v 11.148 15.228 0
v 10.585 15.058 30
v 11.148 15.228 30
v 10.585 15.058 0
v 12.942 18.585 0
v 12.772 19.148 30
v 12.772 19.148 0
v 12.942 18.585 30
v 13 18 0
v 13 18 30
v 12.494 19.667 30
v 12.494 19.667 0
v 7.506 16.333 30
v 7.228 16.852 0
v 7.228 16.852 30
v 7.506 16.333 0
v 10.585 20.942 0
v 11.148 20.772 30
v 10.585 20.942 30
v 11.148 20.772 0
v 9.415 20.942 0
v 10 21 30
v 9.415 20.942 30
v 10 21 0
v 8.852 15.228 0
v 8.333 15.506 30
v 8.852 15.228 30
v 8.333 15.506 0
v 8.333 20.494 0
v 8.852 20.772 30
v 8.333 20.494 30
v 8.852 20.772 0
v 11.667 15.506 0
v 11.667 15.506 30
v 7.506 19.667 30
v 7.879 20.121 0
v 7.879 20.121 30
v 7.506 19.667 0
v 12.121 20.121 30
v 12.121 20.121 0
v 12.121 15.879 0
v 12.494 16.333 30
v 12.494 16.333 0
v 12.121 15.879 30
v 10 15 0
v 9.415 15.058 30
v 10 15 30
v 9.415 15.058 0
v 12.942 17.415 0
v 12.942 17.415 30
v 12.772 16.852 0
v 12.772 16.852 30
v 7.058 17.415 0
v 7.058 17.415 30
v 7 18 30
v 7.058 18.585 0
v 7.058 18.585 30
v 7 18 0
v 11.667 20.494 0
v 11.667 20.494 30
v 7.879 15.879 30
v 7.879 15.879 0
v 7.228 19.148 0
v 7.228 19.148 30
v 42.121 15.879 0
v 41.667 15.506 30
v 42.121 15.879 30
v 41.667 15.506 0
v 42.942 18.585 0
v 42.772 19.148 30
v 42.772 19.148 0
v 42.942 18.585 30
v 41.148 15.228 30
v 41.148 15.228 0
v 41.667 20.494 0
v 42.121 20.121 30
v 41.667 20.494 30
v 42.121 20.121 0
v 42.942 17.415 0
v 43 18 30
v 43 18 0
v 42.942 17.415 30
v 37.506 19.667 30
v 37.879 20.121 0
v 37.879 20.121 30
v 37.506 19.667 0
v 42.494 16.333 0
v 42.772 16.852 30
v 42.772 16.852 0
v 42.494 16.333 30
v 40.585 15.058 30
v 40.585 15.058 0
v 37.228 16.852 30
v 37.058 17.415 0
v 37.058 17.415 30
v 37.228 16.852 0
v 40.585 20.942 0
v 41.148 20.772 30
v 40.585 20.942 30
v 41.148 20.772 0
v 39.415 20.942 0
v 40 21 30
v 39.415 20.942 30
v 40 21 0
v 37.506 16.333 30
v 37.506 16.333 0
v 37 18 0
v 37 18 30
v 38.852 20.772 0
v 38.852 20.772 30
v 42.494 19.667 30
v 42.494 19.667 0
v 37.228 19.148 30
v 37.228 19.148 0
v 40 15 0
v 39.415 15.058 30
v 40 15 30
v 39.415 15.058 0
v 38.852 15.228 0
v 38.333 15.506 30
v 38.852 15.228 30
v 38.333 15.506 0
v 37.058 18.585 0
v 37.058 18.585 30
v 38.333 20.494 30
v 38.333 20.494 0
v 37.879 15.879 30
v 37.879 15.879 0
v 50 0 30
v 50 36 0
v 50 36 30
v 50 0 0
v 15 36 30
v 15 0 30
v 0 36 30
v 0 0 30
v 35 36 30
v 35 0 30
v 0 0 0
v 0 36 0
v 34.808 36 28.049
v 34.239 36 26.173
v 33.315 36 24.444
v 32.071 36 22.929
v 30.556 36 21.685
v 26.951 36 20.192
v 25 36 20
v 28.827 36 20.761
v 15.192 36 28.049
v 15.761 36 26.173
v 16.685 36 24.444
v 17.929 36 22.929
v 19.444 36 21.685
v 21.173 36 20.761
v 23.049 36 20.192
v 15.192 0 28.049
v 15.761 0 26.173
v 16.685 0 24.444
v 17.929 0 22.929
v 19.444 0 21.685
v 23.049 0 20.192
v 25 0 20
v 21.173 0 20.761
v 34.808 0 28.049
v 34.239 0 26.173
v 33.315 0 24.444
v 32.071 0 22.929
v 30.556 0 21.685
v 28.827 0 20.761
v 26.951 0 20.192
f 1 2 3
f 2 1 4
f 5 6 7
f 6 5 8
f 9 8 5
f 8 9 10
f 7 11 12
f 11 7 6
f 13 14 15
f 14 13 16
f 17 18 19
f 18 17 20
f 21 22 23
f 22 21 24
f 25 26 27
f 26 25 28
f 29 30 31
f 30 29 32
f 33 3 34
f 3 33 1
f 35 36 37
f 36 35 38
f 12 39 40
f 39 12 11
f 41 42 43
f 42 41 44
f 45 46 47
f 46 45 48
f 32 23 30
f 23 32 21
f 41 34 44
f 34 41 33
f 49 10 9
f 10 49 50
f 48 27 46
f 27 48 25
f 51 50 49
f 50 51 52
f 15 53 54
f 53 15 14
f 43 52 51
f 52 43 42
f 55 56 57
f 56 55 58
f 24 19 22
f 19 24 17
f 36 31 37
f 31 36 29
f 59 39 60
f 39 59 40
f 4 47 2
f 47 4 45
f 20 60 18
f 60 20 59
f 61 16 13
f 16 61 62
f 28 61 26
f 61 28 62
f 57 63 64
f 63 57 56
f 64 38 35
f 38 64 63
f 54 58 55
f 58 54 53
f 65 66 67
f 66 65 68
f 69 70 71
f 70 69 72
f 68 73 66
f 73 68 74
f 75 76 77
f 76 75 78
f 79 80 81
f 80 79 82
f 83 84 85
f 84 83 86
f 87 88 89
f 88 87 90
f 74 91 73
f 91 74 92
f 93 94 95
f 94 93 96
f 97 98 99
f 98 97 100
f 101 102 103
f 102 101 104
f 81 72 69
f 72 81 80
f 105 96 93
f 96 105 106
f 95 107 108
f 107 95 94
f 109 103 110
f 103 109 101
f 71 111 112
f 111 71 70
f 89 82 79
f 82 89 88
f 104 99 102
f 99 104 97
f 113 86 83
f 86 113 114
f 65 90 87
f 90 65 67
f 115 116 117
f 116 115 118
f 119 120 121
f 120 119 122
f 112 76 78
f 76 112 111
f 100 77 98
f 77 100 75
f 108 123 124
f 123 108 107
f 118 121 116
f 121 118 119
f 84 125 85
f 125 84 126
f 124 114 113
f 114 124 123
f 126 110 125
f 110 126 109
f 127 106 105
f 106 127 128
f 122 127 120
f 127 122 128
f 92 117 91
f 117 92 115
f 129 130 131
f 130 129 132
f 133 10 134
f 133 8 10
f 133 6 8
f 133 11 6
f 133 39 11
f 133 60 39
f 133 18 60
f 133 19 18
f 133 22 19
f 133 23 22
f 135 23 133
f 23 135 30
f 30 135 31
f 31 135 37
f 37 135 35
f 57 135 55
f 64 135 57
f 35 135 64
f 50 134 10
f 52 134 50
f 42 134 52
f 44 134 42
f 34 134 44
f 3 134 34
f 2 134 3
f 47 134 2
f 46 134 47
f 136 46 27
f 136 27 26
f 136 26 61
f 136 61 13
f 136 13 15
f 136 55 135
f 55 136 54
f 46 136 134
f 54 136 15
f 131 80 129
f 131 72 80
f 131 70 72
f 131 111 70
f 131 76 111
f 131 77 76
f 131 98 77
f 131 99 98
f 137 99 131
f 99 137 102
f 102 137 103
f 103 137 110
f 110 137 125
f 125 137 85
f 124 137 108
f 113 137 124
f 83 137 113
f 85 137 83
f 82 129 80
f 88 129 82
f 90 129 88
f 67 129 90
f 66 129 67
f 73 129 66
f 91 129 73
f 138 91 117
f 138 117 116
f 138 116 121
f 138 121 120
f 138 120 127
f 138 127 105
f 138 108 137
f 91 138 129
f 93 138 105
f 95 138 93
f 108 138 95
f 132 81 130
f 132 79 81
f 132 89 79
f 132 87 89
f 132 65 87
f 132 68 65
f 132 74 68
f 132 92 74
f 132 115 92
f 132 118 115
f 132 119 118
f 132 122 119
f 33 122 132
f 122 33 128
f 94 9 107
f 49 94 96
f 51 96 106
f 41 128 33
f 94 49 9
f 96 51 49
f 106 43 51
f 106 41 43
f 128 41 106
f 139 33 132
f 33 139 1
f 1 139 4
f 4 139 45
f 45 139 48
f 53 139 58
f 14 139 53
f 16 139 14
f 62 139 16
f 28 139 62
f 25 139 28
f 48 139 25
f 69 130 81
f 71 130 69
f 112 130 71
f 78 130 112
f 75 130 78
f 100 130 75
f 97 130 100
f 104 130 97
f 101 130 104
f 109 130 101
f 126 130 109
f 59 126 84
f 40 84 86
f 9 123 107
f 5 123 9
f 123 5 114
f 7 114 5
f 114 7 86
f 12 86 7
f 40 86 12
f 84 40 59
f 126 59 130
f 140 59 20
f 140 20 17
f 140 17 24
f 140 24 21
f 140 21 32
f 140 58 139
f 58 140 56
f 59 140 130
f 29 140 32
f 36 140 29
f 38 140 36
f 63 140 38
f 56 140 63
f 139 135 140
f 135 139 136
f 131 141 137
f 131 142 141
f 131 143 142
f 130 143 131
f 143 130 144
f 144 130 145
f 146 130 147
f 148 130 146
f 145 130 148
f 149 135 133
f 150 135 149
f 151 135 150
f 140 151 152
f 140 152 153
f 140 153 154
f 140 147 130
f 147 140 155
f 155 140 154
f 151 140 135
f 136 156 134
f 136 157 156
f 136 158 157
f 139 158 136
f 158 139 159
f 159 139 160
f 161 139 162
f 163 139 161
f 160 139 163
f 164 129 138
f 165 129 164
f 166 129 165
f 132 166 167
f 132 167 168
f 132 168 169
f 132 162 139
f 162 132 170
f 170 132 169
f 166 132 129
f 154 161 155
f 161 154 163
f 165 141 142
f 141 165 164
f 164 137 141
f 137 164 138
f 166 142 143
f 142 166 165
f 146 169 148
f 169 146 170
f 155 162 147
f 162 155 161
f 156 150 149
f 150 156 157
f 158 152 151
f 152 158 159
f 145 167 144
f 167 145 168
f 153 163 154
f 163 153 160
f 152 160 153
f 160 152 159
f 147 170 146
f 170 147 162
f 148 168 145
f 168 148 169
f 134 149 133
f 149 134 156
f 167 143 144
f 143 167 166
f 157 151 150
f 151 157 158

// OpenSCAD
$fn = 32;

// ----------------------------------------------------------------------
// Saddle clamp: plain shaft clamp
// ----------------------------------------------------------------------

// --- parameters (mm) ---
blk_l = 50;               // block length, X
blk_w = 36;               // block width, Y
blk_h = 30;               // block height
clamp_r = 10;             // shaft groove radius
hole_r = 3;               // bolt hole radius
hole_m = 10;              // bolt hole margin from the ends

saw_depth = clamp_r + 3;  // saw kerf depth

difference() {
  cube([blk_l, blk_w, blk_h]);
  translate([blk_l / 2, -1, blk_h])
    rotate([-90, 0, 0])
      cylinder(h = blk_w + 2, r = clamp_r);
  for (sx = [0, 1])
    translate([sx ? blk_l - hole_m : hole_m, blk_w / 2, -1])
      cylinder(r = hole_r, h = blk_h + 2);
}
